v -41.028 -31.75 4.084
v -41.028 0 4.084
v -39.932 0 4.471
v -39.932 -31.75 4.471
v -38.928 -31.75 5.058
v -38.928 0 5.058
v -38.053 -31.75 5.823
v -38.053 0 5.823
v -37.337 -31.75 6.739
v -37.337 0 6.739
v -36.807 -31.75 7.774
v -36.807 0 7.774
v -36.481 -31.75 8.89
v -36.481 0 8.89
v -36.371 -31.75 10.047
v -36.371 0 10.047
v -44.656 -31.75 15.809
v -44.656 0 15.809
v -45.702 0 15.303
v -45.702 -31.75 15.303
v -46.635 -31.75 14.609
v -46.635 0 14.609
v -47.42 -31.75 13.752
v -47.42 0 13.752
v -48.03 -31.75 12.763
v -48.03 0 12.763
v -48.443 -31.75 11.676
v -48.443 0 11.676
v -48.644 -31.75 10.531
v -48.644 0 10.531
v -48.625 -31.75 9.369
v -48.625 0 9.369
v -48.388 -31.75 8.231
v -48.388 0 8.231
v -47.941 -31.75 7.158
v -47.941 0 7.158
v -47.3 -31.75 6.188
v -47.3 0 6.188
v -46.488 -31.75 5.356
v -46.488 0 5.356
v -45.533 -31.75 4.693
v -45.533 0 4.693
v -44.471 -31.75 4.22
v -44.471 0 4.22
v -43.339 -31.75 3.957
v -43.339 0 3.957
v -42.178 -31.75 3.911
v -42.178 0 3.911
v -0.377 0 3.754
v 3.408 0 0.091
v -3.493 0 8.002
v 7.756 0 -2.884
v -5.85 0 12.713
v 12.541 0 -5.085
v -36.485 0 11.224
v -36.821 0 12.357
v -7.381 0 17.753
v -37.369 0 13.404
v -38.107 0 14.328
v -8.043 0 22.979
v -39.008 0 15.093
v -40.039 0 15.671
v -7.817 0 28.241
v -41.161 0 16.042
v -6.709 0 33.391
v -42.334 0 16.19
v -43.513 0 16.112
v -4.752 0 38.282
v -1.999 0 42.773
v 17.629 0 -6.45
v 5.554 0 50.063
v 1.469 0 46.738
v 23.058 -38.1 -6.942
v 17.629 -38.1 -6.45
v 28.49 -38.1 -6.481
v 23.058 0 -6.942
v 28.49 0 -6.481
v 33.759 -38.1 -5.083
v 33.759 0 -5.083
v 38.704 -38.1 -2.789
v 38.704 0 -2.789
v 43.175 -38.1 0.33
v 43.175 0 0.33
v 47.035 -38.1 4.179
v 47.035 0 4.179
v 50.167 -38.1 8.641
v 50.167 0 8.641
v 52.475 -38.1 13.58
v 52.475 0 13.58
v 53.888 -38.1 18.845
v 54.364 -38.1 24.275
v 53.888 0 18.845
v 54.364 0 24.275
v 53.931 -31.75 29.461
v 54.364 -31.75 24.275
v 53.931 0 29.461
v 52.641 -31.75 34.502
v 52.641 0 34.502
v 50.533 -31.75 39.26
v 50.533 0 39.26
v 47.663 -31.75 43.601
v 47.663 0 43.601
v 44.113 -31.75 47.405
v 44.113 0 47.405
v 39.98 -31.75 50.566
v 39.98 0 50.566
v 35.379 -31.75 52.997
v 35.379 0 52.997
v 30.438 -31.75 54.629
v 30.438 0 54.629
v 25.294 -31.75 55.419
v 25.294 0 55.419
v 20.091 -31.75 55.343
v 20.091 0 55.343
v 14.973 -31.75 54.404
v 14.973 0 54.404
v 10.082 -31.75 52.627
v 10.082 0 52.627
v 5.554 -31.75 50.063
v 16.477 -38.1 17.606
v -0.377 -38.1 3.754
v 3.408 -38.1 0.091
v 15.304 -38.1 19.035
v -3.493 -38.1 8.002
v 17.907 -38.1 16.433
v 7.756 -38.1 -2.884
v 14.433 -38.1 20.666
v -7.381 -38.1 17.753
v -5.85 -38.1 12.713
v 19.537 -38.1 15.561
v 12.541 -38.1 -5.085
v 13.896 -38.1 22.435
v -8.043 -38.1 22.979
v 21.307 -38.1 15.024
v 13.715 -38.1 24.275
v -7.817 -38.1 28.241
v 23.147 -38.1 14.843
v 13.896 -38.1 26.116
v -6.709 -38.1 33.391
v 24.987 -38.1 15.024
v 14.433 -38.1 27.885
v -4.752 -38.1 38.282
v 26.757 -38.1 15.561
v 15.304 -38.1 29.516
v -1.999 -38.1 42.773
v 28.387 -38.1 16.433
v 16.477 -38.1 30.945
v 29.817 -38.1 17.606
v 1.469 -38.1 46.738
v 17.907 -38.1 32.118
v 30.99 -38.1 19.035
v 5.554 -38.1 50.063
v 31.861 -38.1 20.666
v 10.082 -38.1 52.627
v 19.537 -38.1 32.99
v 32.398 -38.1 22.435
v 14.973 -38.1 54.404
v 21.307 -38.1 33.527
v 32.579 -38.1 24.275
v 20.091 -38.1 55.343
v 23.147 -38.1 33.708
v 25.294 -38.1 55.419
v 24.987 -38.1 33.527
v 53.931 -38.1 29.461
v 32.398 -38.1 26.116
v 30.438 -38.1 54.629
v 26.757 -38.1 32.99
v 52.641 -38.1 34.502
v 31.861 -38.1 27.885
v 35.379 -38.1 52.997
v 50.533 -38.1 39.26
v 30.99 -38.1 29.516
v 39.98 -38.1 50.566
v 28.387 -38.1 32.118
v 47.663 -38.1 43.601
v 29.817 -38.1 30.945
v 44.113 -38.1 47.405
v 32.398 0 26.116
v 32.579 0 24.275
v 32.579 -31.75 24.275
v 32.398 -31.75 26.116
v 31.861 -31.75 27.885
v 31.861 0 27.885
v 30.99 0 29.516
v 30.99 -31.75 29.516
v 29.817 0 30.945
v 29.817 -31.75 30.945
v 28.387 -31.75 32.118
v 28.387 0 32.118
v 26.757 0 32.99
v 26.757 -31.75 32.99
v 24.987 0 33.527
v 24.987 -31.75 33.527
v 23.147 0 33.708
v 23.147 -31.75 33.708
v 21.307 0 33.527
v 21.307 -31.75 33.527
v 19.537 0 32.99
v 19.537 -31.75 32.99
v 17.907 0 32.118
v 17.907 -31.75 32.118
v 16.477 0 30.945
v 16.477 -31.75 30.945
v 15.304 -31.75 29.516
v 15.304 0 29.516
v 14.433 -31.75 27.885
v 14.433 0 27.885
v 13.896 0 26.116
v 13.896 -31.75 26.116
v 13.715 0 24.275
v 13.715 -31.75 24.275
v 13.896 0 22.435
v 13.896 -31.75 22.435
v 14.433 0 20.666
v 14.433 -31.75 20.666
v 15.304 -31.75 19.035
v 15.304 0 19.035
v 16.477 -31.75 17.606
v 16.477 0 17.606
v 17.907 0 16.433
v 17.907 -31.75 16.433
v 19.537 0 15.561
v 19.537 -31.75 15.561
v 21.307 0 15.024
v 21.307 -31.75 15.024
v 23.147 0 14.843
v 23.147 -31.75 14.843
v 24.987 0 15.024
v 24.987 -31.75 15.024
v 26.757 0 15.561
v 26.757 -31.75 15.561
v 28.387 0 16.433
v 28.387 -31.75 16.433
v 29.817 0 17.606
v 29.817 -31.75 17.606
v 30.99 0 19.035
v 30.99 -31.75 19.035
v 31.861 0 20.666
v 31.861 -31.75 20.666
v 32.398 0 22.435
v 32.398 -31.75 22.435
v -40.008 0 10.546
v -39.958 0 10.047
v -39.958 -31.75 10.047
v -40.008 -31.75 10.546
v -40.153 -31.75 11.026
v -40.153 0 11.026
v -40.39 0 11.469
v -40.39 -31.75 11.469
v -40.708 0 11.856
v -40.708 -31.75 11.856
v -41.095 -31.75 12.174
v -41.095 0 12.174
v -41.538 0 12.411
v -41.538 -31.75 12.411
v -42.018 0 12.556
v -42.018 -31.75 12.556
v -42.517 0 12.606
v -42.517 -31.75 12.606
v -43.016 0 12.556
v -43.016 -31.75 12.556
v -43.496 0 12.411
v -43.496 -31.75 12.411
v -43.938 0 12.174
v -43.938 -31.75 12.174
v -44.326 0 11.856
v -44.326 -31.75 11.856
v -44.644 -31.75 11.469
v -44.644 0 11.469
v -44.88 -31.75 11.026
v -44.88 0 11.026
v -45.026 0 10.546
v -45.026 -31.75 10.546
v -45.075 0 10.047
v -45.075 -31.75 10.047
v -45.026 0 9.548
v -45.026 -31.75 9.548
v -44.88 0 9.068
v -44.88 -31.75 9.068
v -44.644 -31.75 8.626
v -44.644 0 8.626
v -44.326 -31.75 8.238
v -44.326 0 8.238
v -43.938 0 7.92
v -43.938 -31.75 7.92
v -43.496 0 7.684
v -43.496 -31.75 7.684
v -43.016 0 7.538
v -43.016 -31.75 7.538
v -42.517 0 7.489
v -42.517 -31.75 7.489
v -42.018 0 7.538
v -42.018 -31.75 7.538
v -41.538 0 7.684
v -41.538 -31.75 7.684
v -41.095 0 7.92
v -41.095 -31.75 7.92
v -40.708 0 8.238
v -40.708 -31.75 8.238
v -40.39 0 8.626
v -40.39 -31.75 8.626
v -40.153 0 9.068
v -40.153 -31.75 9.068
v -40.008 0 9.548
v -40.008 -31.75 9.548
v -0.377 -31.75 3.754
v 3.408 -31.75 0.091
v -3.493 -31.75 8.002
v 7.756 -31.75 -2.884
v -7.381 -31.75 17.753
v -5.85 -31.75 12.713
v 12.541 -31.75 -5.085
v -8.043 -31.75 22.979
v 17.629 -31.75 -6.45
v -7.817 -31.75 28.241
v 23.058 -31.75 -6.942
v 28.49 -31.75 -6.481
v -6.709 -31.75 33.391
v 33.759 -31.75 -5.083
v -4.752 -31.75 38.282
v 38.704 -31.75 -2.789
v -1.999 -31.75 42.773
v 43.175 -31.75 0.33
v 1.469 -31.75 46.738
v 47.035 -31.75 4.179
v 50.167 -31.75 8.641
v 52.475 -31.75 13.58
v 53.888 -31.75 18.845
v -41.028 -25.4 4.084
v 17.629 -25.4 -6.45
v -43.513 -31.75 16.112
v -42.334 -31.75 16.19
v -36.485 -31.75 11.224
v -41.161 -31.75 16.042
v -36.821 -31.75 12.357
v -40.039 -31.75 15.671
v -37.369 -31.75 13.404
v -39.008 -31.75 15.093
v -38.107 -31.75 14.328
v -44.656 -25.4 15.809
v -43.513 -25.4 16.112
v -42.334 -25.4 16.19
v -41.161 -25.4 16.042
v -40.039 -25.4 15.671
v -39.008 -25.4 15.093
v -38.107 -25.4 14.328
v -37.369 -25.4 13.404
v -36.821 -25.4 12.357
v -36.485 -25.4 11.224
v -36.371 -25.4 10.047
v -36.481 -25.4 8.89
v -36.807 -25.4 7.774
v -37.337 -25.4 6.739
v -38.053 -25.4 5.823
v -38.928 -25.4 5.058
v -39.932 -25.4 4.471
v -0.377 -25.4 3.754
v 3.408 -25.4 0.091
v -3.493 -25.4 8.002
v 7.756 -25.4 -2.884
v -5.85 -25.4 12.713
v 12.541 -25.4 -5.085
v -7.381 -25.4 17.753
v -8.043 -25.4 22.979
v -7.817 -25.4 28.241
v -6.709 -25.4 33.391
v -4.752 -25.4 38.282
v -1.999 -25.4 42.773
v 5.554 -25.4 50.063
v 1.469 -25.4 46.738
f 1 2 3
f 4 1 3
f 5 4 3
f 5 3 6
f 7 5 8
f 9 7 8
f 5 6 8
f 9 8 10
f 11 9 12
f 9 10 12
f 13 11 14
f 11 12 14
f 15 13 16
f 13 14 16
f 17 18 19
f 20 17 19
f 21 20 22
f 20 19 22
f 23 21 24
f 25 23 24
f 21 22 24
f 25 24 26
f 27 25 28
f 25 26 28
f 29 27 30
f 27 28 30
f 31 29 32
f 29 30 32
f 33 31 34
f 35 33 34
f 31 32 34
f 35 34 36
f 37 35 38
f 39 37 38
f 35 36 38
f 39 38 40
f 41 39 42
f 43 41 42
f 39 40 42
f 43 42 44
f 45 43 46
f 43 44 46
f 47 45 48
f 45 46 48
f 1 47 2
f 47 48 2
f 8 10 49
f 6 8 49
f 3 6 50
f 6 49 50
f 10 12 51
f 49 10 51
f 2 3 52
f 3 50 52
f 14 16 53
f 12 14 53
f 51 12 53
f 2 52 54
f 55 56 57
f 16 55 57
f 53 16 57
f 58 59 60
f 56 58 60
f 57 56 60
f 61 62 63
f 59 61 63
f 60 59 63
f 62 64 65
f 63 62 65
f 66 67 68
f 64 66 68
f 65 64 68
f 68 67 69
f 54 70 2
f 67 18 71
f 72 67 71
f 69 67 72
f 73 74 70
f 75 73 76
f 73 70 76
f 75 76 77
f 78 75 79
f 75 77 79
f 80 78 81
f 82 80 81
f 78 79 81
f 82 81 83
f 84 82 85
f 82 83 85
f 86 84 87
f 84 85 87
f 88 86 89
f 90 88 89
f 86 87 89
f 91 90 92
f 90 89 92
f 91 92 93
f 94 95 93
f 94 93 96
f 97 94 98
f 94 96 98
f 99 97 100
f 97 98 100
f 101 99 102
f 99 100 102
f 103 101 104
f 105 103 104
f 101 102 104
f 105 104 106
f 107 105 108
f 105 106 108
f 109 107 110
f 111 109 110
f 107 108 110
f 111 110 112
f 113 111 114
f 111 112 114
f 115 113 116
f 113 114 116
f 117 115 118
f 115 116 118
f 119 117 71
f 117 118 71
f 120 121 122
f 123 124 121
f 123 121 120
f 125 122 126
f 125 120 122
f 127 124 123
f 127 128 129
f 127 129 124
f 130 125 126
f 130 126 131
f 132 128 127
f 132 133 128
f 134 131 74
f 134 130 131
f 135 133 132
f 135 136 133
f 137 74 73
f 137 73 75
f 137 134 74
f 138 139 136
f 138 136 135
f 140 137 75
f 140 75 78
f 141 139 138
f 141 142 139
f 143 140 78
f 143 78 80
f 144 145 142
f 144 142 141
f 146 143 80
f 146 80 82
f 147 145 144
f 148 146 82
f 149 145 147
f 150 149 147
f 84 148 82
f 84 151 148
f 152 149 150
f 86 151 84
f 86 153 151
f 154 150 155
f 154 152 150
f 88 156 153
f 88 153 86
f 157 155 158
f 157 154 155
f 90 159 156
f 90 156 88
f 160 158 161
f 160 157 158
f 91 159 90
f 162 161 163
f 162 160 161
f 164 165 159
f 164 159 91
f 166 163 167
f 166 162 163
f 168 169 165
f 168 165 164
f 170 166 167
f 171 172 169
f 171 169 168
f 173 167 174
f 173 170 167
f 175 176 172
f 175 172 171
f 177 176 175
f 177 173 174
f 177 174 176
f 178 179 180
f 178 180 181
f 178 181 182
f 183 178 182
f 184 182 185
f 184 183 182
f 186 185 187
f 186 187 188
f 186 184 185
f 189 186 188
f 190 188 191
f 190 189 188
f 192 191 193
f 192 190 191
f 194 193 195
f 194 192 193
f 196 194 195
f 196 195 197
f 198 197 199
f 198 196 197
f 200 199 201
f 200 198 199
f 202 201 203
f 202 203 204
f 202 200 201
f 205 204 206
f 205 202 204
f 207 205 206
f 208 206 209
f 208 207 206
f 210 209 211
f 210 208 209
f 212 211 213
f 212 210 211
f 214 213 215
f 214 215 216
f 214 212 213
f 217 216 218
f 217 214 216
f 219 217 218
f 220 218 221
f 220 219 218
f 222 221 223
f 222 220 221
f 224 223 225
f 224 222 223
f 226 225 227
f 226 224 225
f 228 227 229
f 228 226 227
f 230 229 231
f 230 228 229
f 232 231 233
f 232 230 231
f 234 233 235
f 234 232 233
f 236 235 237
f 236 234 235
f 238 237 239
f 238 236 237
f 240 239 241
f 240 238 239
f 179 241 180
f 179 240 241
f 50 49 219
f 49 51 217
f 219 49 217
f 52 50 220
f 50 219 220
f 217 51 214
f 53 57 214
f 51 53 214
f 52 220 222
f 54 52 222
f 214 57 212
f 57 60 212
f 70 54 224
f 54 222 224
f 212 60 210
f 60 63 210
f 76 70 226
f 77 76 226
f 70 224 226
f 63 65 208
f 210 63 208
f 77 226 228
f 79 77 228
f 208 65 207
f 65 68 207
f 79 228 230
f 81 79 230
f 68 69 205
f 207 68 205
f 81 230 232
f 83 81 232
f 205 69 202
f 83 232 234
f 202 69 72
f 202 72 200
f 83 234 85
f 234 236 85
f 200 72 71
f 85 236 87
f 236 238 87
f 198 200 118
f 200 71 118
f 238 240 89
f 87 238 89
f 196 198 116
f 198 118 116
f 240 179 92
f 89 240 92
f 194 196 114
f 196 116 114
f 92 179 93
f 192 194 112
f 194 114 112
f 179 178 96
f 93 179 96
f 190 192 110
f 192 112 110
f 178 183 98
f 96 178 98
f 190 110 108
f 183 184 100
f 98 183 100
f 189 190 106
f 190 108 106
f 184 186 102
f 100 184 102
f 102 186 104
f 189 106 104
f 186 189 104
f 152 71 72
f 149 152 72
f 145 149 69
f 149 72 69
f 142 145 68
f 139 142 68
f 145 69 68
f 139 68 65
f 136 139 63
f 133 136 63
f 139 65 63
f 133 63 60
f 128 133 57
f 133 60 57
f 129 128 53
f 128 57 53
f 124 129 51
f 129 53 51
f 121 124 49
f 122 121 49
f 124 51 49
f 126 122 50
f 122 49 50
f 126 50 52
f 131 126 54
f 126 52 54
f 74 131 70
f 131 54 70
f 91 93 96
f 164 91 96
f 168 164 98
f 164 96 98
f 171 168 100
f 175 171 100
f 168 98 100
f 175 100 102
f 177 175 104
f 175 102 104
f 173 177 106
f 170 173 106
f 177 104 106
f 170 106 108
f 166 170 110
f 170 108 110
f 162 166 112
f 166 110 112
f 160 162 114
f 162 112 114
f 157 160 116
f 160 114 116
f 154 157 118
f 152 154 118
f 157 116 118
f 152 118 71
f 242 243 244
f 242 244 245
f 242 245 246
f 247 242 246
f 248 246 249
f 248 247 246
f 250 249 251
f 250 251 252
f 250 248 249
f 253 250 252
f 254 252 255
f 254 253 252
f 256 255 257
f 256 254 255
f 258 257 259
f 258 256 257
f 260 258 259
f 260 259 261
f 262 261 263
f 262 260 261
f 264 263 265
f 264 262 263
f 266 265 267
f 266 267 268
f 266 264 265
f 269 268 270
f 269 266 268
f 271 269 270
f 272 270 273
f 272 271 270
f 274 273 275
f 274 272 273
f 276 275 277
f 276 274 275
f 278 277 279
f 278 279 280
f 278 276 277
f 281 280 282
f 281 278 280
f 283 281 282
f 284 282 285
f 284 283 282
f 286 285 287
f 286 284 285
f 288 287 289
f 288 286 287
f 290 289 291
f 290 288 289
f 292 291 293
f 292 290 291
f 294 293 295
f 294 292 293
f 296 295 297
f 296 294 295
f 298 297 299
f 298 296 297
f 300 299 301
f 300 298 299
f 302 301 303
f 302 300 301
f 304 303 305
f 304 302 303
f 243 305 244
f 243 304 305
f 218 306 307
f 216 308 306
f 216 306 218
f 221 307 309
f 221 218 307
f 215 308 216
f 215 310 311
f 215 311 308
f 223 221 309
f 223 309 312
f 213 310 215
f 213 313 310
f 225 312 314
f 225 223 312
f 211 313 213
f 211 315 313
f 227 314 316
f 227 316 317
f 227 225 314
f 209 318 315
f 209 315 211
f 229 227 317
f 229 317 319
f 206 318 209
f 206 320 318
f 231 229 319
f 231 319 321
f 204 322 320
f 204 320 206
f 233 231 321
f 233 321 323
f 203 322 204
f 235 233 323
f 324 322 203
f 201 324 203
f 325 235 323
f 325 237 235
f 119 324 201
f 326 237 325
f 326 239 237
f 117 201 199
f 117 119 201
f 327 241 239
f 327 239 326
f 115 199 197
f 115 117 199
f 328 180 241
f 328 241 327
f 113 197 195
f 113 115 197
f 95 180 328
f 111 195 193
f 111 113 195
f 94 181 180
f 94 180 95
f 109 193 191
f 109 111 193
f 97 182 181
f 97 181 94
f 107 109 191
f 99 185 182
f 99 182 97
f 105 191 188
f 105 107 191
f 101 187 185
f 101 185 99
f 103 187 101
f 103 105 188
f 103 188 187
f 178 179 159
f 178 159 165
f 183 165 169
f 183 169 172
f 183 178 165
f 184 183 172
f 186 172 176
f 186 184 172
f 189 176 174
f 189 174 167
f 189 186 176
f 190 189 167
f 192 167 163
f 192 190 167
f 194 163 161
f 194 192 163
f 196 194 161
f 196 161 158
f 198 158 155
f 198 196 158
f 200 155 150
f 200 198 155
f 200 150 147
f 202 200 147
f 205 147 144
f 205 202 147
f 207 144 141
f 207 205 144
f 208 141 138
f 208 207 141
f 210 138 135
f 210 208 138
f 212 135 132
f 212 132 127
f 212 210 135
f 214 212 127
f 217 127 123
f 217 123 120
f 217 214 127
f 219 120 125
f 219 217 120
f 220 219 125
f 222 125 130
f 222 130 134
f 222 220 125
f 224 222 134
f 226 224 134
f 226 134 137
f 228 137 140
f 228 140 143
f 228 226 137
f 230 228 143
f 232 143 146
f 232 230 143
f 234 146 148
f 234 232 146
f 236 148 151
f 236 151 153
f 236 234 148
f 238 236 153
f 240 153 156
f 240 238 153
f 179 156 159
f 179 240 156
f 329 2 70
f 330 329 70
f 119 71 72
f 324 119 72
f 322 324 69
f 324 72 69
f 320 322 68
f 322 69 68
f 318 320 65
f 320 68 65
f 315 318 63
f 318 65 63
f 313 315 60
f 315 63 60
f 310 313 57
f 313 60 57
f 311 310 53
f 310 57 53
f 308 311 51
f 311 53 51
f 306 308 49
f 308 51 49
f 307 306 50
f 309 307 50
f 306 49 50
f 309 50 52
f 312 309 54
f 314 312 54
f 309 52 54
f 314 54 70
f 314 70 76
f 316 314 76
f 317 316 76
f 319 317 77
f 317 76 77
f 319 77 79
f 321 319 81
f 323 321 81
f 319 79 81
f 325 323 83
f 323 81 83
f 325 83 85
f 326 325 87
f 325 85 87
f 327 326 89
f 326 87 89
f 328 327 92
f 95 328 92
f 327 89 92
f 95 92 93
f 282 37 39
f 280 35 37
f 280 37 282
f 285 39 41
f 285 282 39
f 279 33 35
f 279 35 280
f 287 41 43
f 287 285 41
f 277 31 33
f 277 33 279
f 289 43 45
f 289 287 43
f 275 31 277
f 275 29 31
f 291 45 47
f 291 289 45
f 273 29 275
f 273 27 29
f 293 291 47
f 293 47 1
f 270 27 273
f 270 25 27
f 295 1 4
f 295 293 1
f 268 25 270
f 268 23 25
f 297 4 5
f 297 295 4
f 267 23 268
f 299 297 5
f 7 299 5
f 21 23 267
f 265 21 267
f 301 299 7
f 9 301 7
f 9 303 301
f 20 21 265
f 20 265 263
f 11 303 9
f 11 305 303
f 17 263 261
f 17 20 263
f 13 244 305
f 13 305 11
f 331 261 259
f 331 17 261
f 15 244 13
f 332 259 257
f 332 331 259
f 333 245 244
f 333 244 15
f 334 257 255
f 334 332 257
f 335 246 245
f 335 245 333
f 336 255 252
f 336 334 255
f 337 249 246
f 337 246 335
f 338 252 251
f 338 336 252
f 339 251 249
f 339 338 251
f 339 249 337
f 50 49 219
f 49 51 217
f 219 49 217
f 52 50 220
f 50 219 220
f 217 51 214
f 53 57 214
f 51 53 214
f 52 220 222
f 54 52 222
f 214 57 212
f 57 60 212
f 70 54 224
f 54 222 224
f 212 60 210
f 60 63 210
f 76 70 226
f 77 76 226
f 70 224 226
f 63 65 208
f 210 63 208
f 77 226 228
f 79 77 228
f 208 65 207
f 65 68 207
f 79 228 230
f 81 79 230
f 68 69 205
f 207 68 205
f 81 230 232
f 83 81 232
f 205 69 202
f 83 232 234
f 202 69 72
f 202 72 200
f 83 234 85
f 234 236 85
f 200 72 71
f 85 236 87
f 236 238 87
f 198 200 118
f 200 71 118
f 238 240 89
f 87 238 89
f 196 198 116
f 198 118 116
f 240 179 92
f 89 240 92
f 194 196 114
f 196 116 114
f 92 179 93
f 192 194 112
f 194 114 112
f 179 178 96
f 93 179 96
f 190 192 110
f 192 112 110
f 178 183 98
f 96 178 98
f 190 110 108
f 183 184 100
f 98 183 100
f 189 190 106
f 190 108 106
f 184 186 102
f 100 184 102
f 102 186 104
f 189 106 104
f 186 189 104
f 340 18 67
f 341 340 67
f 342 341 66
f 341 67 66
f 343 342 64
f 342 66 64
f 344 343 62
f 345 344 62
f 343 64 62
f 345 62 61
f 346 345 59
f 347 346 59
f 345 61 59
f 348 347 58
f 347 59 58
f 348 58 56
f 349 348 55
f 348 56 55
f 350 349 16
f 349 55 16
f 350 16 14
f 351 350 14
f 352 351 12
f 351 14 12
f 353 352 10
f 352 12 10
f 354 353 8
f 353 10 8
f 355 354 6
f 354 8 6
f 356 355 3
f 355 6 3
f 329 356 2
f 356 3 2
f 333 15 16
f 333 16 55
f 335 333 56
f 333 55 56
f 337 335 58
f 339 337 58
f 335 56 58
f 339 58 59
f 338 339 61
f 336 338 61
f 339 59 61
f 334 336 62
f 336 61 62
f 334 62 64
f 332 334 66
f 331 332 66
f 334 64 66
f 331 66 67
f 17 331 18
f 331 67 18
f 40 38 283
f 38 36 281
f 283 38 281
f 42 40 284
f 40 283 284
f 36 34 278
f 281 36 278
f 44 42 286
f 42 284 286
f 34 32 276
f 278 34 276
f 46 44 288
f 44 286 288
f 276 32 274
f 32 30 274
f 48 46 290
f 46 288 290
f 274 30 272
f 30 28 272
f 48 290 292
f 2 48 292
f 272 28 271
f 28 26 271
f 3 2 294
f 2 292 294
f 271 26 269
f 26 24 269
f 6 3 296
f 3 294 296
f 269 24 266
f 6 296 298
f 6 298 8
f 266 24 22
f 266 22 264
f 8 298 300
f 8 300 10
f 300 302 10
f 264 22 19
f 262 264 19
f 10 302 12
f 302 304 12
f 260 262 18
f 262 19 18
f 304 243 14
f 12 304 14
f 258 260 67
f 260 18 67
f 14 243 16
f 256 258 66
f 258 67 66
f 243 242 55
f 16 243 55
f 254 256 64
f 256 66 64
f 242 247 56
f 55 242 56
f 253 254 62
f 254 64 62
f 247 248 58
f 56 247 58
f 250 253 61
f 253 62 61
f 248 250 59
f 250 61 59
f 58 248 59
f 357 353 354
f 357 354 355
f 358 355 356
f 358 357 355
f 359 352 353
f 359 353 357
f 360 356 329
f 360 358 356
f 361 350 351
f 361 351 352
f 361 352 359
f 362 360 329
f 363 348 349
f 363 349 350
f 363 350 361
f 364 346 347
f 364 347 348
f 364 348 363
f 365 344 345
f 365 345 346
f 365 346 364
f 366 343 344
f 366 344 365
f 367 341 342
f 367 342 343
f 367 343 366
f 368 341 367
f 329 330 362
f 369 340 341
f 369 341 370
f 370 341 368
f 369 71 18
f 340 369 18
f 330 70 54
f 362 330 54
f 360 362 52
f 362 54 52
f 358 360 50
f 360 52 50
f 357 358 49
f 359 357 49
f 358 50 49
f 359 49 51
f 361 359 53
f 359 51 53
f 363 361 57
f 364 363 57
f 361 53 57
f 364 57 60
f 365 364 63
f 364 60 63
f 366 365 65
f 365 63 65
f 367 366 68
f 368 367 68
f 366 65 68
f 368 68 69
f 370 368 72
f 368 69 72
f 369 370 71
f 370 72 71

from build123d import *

# Parameters (mm, degrees)
F0_R     = 2.558436
F0_R_2   = 9.432354
F1_DEPTH = 31.75
F2_DEPTH = 25.4
F3_DEPTH = 38.1


with BuildPart() as f1:
    # F0 (on Front) → F1 (new body)
    with BuildSketch(Plane.XZ):
        with BuildLine():
            ThreePointArc((-41.028275, 4.084268), (-37.673218, 6.264085), (-36.370888, 10.047198))
            ThreePointArc((-36.370888, 10.047198), (-39.007807, 15.092911), (-44.655812, 15.808872))
            ThreePointArc((-44.655812, 15.808872), (-48.388119, 8.230641), (-41.028275, 4.084268))
        make_face()
        with Locations((-42.516802, 10.047198)):
            Circle(F0_R, mode=Mode.SUBTRACT)
        with BuildLine():
            ThreePointArc((54.364225, 24.275498), (37.729792, 51.877228), (5.554196, 50.063152))
            ThreePointArc((5.554196, 50.063152), (-7.381061, 17.752772), (17.628982, -6.450104))
            ThreePointArc((17.628982, -6.450104), (43.175199, 0.330036), (54.364225, 24.275498))
        make_face()
        with Locations((23.147054, 24.275498)):
            Circle(F0_R_2, mode=Mode.SUBTRACT)
    extrude(amount=F1_DEPTH)


with BuildPart() as f2:
    # F0 (on Front) → F2 (new body)
    with BuildSketch(Plane.XZ):
        with BuildLine():
            ThreePointArc((-44.655812, 15.808872), (-39.007807, 15.092911), (-36.370888, 10.047198))
            ThreePointArc((-36.370888, 10.047198), (-37.673218, 6.264085), (-41.028275, 4.084268))
            Line((-41.028275, 4.084268), (17.628982, -6.450104))
            ThreePointArc((17.628982, -6.450104), (-7.381061, 17.752772), (5.554196, 50.063152))
            Line((5.554196, 50.063152), (-44.655812, 15.808872))
        make_face()
    extrude(amount=F2_DEPTH)


with BuildPart() as f3:
    # F0 (on Front) → F3 (new body)
    with BuildSketch(Plane.XZ):
        with BuildLine():
            ThreePointArc((54.364225, 24.275498), (37.729792, 51.877228), (5.554196, 50.063152))
            ThreePointArc((5.554196, 50.063152), (-7.381061, 17.752772), (17.628982, -6.450104))
            ThreePointArc((17.628982, -6.450104), (43.175199, 0.330036), (54.364225, 24.275498))
        make_face()
        with Locations((23.147054, 24.275498)):
            Circle(F0_R_2, mode=Mode.SUBTRACT)
    extrude(amount=F3_DEPTH)


solid = Compound([f1.part, f2.part, f3.part])
